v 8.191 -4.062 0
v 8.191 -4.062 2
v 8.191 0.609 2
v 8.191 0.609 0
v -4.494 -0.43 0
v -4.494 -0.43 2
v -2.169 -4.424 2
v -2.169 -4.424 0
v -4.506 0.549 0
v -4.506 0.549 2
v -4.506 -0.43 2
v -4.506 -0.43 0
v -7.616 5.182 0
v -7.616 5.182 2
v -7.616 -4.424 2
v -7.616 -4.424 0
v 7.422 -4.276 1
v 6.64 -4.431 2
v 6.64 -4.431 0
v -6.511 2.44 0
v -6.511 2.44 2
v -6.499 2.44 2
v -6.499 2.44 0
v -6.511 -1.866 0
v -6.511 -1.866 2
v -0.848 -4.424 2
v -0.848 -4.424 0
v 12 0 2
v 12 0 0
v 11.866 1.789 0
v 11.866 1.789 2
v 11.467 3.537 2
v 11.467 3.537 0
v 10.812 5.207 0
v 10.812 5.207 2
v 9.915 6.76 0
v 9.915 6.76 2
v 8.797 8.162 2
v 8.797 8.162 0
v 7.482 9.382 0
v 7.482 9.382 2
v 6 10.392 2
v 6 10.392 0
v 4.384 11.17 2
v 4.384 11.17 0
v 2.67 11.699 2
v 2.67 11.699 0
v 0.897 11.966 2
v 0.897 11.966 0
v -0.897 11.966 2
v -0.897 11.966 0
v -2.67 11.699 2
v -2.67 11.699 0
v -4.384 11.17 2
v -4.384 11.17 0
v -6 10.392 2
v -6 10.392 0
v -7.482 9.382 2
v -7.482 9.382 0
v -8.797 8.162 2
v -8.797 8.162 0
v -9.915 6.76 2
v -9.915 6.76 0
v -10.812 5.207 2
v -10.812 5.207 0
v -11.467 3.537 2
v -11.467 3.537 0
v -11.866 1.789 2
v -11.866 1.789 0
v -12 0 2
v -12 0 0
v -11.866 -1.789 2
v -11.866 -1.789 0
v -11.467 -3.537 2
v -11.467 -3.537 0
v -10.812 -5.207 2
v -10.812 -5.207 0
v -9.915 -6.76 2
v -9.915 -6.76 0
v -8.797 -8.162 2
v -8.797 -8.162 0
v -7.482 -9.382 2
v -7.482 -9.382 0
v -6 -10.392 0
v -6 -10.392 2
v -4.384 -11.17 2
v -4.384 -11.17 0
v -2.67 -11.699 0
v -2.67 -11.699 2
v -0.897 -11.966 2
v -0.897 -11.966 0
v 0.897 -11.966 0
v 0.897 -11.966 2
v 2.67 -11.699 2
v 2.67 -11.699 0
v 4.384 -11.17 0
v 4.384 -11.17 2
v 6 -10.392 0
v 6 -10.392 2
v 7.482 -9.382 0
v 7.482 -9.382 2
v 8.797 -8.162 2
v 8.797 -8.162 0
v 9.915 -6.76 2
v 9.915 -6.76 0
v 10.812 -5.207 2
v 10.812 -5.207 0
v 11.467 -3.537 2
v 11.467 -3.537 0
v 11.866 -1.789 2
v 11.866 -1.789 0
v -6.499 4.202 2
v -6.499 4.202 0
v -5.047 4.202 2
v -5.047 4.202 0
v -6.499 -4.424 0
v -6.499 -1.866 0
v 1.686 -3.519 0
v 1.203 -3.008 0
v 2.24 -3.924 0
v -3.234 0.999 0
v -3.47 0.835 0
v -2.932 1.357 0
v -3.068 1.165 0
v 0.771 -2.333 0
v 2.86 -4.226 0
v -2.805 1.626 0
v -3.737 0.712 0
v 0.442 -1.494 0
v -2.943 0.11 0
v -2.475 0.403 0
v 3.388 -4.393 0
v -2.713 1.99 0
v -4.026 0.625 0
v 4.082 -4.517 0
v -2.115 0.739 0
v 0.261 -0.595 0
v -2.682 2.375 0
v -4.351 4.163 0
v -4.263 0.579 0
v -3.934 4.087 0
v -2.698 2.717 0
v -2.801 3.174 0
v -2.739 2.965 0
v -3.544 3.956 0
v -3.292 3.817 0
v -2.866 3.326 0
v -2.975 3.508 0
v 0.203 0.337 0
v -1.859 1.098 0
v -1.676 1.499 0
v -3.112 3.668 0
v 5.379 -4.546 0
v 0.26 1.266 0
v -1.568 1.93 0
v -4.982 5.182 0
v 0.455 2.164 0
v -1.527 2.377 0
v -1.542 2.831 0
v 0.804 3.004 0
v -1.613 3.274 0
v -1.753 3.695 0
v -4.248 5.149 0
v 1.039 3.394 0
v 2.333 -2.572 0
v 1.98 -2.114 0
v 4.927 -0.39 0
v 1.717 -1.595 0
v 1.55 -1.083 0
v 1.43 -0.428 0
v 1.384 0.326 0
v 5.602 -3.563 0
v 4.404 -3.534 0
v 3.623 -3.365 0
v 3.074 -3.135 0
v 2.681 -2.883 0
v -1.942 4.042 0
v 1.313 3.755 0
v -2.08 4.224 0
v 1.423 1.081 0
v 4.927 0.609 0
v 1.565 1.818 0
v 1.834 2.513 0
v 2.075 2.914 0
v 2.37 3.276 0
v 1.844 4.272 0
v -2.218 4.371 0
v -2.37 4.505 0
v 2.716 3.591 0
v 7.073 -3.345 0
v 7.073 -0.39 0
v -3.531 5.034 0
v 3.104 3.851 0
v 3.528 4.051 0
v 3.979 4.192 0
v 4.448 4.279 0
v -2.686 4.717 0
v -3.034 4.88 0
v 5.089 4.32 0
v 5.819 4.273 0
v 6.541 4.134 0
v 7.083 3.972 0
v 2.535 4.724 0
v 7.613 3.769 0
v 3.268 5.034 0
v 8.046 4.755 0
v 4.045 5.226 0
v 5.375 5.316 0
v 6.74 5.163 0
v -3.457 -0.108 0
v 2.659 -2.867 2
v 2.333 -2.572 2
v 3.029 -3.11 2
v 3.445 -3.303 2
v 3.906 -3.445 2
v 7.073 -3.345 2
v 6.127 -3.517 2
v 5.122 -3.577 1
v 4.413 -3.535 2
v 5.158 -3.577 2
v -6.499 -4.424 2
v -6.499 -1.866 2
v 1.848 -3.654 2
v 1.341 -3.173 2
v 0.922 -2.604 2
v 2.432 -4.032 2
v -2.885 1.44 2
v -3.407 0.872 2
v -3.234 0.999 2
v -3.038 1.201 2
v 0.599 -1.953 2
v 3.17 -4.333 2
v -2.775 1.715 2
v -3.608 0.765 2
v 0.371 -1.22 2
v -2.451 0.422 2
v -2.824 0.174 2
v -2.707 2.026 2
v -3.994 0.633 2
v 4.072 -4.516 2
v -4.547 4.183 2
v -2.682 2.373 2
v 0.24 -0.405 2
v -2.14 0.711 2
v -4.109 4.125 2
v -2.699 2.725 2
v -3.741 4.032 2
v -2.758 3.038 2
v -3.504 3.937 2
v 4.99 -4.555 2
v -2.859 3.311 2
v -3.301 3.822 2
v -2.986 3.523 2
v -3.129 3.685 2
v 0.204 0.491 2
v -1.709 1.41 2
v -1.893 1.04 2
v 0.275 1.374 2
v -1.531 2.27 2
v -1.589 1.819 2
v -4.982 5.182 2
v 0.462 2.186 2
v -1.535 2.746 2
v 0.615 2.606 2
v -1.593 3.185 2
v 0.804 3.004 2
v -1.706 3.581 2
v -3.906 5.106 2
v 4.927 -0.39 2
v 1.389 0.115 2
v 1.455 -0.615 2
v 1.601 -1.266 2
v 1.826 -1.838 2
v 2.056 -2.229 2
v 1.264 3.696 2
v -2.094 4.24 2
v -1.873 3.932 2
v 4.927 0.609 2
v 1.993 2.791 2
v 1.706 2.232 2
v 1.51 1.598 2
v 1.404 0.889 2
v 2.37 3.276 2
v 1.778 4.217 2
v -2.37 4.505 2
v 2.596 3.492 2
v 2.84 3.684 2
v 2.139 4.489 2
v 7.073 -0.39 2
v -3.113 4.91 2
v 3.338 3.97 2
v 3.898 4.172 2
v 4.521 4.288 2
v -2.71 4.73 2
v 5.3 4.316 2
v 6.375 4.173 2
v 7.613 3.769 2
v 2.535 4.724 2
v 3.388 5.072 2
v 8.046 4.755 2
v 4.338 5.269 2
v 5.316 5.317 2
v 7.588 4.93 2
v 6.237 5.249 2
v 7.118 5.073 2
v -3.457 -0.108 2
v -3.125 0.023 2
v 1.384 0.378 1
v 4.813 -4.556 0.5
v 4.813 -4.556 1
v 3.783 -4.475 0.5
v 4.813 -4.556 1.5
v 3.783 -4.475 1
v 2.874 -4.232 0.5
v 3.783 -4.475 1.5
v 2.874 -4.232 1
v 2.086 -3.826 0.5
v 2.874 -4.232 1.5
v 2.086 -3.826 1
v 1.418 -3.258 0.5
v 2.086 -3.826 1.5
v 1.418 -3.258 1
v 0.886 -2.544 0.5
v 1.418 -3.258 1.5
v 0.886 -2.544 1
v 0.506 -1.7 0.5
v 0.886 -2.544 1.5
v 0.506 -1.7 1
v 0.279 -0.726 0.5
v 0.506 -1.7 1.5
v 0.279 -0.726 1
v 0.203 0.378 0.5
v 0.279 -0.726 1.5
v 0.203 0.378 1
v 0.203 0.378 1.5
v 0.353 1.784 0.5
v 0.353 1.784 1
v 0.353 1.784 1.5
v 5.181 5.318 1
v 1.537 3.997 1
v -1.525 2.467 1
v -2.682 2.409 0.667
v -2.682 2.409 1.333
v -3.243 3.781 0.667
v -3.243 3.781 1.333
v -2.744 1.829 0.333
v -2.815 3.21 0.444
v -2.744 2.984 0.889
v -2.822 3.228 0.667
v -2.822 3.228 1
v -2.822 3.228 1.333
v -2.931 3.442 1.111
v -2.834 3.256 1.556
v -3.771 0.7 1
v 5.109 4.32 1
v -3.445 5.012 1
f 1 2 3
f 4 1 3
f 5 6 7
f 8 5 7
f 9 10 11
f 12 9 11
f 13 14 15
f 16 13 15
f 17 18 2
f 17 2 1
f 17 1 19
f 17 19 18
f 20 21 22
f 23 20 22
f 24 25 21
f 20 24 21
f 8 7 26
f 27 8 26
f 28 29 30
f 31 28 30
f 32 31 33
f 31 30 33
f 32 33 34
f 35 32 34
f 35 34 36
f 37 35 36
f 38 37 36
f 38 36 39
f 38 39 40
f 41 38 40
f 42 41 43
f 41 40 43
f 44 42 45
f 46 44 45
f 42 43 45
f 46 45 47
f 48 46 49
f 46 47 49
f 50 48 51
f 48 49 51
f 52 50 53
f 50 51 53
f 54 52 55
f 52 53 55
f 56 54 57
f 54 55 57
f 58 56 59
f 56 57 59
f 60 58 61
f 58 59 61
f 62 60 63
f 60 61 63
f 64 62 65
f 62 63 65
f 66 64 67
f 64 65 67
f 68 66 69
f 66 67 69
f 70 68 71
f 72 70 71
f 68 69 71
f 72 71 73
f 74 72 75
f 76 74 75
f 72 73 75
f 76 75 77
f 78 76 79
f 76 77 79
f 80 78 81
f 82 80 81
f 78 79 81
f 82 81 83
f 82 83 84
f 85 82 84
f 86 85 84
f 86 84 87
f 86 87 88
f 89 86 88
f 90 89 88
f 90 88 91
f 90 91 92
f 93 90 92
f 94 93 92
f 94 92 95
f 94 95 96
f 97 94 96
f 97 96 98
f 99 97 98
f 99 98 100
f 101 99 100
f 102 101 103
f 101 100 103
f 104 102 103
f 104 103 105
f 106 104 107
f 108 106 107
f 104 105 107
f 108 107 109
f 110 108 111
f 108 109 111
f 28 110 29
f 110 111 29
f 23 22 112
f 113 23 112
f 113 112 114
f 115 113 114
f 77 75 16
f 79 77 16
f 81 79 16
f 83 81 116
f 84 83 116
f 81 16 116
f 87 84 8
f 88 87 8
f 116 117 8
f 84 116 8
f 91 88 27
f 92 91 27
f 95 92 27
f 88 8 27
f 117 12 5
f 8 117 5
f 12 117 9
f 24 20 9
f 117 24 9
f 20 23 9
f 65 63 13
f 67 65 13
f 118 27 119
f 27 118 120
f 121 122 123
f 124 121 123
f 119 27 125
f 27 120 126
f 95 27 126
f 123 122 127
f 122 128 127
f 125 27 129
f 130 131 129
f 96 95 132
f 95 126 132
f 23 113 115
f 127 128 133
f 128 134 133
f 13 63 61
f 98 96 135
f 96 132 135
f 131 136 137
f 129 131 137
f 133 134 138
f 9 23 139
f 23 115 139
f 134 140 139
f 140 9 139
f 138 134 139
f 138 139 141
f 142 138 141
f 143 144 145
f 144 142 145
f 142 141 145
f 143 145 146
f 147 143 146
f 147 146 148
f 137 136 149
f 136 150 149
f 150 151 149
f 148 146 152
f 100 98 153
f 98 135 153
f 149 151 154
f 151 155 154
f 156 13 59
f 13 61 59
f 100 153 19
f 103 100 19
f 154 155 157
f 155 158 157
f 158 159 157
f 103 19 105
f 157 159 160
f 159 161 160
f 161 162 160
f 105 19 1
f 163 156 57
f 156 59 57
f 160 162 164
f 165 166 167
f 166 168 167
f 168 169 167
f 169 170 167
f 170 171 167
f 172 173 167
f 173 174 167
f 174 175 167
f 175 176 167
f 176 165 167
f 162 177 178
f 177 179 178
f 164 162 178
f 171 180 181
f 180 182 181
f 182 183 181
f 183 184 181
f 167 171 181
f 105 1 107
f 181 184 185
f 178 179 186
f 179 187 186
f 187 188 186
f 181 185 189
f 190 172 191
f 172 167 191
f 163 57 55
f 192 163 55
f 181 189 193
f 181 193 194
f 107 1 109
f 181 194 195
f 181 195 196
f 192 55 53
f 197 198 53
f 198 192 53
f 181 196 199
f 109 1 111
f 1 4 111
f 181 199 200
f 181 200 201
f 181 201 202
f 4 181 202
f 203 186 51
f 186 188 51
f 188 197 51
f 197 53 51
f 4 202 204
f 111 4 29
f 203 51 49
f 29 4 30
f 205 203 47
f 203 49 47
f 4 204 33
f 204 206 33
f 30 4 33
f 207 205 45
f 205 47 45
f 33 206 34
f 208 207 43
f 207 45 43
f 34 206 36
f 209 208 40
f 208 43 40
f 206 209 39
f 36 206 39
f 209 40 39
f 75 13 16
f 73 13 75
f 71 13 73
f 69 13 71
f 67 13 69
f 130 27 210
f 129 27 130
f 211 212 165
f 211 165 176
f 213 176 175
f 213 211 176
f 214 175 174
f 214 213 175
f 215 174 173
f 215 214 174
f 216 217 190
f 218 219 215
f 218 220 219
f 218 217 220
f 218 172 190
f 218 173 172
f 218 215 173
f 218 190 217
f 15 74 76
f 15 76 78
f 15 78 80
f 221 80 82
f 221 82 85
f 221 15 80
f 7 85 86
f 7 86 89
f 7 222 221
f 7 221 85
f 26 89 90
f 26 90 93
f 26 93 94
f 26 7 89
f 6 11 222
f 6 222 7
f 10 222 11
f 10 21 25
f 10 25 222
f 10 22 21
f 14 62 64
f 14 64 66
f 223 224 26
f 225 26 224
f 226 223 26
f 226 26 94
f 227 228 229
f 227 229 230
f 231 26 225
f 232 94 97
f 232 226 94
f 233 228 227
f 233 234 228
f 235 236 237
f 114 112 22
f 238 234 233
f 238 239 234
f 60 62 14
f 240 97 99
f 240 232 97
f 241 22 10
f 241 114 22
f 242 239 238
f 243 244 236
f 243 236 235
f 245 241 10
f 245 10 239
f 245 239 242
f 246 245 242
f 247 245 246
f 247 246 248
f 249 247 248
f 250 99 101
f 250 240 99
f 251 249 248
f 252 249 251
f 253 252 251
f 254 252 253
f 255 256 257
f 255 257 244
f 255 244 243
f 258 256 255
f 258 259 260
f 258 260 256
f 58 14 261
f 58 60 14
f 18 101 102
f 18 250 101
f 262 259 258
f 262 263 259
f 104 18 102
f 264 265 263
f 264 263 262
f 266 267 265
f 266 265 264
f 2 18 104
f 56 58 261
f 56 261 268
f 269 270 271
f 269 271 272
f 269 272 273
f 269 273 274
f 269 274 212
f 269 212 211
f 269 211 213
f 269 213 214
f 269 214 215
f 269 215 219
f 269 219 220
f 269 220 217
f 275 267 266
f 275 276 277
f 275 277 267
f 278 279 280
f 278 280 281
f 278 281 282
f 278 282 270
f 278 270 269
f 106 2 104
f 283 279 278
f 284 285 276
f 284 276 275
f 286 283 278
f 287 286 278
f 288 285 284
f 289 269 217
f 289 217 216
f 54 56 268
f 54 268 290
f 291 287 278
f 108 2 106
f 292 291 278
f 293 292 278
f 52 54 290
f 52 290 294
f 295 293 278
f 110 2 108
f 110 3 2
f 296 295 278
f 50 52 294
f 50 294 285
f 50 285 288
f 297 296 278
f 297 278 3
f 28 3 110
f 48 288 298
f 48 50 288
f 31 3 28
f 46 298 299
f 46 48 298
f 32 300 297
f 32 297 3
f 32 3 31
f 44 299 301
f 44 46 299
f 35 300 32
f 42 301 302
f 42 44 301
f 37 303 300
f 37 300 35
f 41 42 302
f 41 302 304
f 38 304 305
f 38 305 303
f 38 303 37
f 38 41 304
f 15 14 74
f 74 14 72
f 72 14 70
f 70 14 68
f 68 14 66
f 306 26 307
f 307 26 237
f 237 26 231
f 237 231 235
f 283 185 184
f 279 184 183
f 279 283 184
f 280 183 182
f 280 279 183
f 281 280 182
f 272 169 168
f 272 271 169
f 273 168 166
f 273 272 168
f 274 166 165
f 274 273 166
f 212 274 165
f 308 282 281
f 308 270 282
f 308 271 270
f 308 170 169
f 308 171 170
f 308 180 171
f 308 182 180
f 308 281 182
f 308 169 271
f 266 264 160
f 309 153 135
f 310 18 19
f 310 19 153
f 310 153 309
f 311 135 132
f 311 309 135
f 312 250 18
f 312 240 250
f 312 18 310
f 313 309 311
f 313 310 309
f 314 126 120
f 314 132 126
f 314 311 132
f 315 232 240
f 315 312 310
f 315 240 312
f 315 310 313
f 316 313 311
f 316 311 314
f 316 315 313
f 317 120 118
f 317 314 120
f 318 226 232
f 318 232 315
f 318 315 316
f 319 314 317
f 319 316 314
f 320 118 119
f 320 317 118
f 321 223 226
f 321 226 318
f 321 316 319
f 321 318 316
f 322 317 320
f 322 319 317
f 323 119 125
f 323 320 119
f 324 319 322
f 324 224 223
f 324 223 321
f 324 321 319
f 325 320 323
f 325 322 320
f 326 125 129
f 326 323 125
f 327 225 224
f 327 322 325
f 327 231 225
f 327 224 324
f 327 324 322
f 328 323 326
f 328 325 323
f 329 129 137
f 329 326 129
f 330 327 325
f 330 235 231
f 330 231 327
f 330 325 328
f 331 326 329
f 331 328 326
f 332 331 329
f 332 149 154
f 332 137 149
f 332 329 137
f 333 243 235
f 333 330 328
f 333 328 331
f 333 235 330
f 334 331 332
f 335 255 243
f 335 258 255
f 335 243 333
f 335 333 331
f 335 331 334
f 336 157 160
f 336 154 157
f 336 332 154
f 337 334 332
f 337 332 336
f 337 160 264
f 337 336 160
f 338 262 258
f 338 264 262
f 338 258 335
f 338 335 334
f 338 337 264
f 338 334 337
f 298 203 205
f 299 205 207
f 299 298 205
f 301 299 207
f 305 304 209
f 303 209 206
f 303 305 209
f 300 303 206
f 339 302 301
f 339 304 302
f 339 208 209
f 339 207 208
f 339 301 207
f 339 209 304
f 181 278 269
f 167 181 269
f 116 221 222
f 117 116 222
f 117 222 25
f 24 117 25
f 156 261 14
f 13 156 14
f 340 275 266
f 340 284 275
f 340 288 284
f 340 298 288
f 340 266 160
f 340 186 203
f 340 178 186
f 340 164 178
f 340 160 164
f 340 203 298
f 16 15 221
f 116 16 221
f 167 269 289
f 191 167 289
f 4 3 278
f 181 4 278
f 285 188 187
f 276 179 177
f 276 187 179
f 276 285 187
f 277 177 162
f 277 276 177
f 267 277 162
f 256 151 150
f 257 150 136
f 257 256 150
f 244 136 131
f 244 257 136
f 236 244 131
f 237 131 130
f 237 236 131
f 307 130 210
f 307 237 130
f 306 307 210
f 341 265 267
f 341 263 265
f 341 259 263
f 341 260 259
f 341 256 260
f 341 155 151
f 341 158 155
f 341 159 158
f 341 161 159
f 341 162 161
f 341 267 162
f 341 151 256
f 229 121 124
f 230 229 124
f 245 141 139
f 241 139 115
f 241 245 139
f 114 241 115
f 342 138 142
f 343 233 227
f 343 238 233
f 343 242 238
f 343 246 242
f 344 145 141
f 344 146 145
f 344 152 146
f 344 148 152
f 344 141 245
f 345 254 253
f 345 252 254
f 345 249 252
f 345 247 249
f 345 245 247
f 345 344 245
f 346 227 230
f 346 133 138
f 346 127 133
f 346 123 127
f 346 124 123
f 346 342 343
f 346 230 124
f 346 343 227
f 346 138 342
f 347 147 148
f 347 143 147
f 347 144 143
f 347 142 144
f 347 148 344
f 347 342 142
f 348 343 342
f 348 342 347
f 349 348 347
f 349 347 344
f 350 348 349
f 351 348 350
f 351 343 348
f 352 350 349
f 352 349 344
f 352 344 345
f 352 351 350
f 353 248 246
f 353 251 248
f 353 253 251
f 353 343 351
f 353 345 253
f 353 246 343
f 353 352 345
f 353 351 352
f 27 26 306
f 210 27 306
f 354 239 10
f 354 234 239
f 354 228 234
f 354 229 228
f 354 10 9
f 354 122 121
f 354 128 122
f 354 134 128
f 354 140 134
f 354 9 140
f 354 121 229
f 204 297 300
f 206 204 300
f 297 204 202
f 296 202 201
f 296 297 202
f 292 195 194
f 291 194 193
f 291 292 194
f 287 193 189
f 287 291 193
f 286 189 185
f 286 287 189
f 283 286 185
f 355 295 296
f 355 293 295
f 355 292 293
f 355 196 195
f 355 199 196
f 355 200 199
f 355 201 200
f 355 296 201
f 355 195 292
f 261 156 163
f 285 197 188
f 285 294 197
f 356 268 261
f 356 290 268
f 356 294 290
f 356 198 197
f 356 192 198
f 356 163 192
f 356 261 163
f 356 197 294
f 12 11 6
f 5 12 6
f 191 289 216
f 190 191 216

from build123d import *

# Parameters (mm, degrees)
F0_R     = 12
F1_DEPTH = 2
F3_DEPTH = 25


with BuildPart() as f1:
    # F0 (on Top) → F1 (new body)
    with BuildSketch(Plane.XY):
        Circle(F0_R)
    extrude(amount=F1_DEPTH)

    # F2 (on face) → F3 (cut)
    with BuildSketch(Plane.XY.offset(2)):
        with BuildLine():
            Line((-6.5106279217, -1.8662924413), (-6.5106279217, 2.4396951776))
            Line((-6.5106279217, 2.4396951776), (-6.4994953498, 2.4396951776))
            Line((-6.4994953498, 2.4396951776), (-6.4994953498, 4.2018918664))
            Line((-6.4994953498, 4.2018918664), (-5.0467973821, 4.2018918664))
            add(Edge.make_bspline(
                [(-3.2430132195, 3.7814293576), (-3.8043306687, 4.2018918664), (-5.0467973821, 4.2018918664)],
                knots=[0, 0, 0, 1, 1, 1], degree=2))
            add(Edge.make_bspline(
                [(-2.6816957703, 2.4086192665), (-2.6816957703, 3.3609668488), (-3.2430132195, 3.7814293576)],
                knots=[0, 0, 0, 1, 1, 1], degree=2))
            add(Edge.make_bspline(
                [(-3.233552813, 0.9990187059), (-2.6816957703, 1.4688855594), (-2.6816957703, 2.4086192665)],
                knots=[0, 0, 0, 1, 1, 1], degree=2))
            add(Edge.make_bspline(
                [(-4.5059826225, 0.5491711407), (-3.6714994229, 0.6261384495), (-3.233552813, 0.9990187059)],
                knots=[0.2064129368, 0.2064129368, 0.2064129368, 1, 1, 1], degree=2))
            Line((-4.5059826225, 0.5491711407), (-4.5059826225, -0.4295026676))
            Line((-4.5059826225, -0.4295026676), (-4.493889183, -0.4295026676))
            Line((-4.493889183, -0.4295026676), (-2.1687315096, -4.4238965008))
            Line((-2.1687315096, -4.4238965008), (-0.8484792321, -4.4238965008))
            Line((-0.8484792321, -4.4238965008), (-3.4574490989, -0.1078488484))
            add(Edge.make_bspline(
                [(-1.5254238712, 2.4674840177), (-1.5254238712, 0.562788853), (-3.4574490989, -0.1078488484)],
                knots=[0, 0, 0, 1, 1, 1], degree=2))
            add(Edge.make_bspline(
                [(-2.3695023575, 4.5046248727), (-1.5254238712, 3.8276802336), (-1.5254238712, 2.4674840177)],
                knots=[0, 0, 0, 1, 1, 1], degree=2))
            add(Edge.make_bspline(
                [(-4.9816256932, 5.1815695118), (-3.2135808439, 5.1815695118), (-2.3695023575, 4.5046248727)],
                knots=[0, 0, 0, 1, 1, 1], degree=2))
            Line((-4.9816256932, 5.1815695118), (-7.6158233106, 5.1815695118))
            Line((-7.6158233106, 5.1815695118), (-7.6158233106, -4.4238965008))
            Line((-7.6158233106, -4.4238965008), (-6.4994953498, -4.4238965008))
            Line((-6.4994953498, -4.4238965008), (-6.4994953498, -1.8662924413))
            Line((-6.4994953498, -1.8662924413), (-6.5106279217, -1.8662924413))
        make_face()
        with BuildLine():
            Line((8.1914647062, 0.609039729), (4.9265733257, 0.609039729))
            Line((4.9265733257, 0.609039729), (4.9265733257, -0.3895587293))
            Line((4.9265733257, -0.3895587293), (7.0730344329, -0.3895587293))
            Line((7.0730344329, -0.3895587293), (7.0730344329, -3.3454101659))
            add(Edge.make_bspline(
                [(5.1220883923, -3.5766645457), (6.1206868506, -3.5766645457), (7.0730344329, -3.3454101659)],
                knots=[0, 0, 0, 1, 1, 1], degree=2))
            add(Edge.make_bspline(
                [(2.3333708029, -2.5717591498), (3.2825649165, -3.5766645457), (5.1220883923, -3.5766645457)],
                knots=[0, 0, 0, 1, 1, 1], degree=2))
            add(Edge.make_bspline(
                [(1.3841766894, 0.3777853492), (1.3841766894, -1.5668537538), (2.3333708029, -2.5717591498)],
                knots=[0, 0, 0, 1, 1, 1], degree=2))
            add(Edge.make_bspline(
                [(2.3701612725, 3.2758231908), (1.3841766894, 2.2320250128), (1.3841766894, 0.3777853492)],
                knots=[0, 0, 0, 1, 1, 1], degree=2))
            add(Edge.make_bspline(
                [(5.109474517, 4.3196213688), (3.3561458555, 4.3196213688), (2.3701612725, 3.2758231908)],
                knots=[0, 0, 0, 1, 1, 1], degree=2))
            add(Edge.make_bspline(
                [(7.6133287567, 3.7688154823), (6.3119972921, 4.3196213688), (5.109474517, 4.3196213688)],
                knots=[0, 0, 0, 1, 1, 1], degree=2))
            Line((7.6133287567, 3.7688154823), (8.0464051407, 4.7548000654))
            add(Edge.make_bspline(
                [(5.1809531435, 5.3182198271), (6.7198459256, 5.3182198271), (8.0464051407, 4.7548000654)],
                knots=[0, 0, 0, 1, 1, 1], degree=2))
            add(Edge.make_bspline(
                [(2.5351928071, 4.7243165335), (3.6651857994, 5.3182198271), (5.1809531435, 5.3182198271)],
                knots=[0, 0, 0, 1, 1, 1], degree=2))
            add(Edge.make_bspline(
                [(0.8039384273, 3.0035737164), (1.4051998149, 4.1304132399), (2.5351928071, 4.7243165335)],
                knots=[0, 0, 0, 1, 1, 1], degree=2))
            add(Edge.make_bspline(
                [(0.2026770398, 0.3777853492), (0.2026770398, 1.8767341929), (0.8039384273, 3.0035737164)],
                knots=[0, 0, 0, 1, 1, 1], degree=2))
            add(Edge.make_bspline(
                [(1.4178136901, -3.2581641953), (0.2026770398, -1.9599861995), (0.2026770398, 0.3777853492)],
                knots=[0, 0, 0, 1, 1, 1], degree=2))
            add(Edge.make_bspline(
                [(4.8130484484, -4.5563421911), (2.6329503404, -4.5563421911), (1.4178136901, -3.2581641953)],
                knots=[0, 0, 0, 1, 1, 1], degree=2))
            add(Edge.make_bspline(
                [(6.6399580489, -4.4312545947), (5.851590845, -4.5563421911), (4.8130484484, -4.5563421911)],
                knots=[0, 0, 0, 1, 1, 1], degree=2))
            add(Edge.make_bspline(
                [(8.1914647062, -4.0622987433), (7.4283252528, -4.3061669984), (6.6399580489, -4.4312545947)],
                knots=[0, 0, 0, 1, 1, 1], degree=2))
            Line((8.1914647062, -4.0622987433), (8.1914647062, 0.609039729))
        make_face()
    extrude(amount=-F3_DEPTH, mode=Mode.SUBTRACT)


solid = f1.part
